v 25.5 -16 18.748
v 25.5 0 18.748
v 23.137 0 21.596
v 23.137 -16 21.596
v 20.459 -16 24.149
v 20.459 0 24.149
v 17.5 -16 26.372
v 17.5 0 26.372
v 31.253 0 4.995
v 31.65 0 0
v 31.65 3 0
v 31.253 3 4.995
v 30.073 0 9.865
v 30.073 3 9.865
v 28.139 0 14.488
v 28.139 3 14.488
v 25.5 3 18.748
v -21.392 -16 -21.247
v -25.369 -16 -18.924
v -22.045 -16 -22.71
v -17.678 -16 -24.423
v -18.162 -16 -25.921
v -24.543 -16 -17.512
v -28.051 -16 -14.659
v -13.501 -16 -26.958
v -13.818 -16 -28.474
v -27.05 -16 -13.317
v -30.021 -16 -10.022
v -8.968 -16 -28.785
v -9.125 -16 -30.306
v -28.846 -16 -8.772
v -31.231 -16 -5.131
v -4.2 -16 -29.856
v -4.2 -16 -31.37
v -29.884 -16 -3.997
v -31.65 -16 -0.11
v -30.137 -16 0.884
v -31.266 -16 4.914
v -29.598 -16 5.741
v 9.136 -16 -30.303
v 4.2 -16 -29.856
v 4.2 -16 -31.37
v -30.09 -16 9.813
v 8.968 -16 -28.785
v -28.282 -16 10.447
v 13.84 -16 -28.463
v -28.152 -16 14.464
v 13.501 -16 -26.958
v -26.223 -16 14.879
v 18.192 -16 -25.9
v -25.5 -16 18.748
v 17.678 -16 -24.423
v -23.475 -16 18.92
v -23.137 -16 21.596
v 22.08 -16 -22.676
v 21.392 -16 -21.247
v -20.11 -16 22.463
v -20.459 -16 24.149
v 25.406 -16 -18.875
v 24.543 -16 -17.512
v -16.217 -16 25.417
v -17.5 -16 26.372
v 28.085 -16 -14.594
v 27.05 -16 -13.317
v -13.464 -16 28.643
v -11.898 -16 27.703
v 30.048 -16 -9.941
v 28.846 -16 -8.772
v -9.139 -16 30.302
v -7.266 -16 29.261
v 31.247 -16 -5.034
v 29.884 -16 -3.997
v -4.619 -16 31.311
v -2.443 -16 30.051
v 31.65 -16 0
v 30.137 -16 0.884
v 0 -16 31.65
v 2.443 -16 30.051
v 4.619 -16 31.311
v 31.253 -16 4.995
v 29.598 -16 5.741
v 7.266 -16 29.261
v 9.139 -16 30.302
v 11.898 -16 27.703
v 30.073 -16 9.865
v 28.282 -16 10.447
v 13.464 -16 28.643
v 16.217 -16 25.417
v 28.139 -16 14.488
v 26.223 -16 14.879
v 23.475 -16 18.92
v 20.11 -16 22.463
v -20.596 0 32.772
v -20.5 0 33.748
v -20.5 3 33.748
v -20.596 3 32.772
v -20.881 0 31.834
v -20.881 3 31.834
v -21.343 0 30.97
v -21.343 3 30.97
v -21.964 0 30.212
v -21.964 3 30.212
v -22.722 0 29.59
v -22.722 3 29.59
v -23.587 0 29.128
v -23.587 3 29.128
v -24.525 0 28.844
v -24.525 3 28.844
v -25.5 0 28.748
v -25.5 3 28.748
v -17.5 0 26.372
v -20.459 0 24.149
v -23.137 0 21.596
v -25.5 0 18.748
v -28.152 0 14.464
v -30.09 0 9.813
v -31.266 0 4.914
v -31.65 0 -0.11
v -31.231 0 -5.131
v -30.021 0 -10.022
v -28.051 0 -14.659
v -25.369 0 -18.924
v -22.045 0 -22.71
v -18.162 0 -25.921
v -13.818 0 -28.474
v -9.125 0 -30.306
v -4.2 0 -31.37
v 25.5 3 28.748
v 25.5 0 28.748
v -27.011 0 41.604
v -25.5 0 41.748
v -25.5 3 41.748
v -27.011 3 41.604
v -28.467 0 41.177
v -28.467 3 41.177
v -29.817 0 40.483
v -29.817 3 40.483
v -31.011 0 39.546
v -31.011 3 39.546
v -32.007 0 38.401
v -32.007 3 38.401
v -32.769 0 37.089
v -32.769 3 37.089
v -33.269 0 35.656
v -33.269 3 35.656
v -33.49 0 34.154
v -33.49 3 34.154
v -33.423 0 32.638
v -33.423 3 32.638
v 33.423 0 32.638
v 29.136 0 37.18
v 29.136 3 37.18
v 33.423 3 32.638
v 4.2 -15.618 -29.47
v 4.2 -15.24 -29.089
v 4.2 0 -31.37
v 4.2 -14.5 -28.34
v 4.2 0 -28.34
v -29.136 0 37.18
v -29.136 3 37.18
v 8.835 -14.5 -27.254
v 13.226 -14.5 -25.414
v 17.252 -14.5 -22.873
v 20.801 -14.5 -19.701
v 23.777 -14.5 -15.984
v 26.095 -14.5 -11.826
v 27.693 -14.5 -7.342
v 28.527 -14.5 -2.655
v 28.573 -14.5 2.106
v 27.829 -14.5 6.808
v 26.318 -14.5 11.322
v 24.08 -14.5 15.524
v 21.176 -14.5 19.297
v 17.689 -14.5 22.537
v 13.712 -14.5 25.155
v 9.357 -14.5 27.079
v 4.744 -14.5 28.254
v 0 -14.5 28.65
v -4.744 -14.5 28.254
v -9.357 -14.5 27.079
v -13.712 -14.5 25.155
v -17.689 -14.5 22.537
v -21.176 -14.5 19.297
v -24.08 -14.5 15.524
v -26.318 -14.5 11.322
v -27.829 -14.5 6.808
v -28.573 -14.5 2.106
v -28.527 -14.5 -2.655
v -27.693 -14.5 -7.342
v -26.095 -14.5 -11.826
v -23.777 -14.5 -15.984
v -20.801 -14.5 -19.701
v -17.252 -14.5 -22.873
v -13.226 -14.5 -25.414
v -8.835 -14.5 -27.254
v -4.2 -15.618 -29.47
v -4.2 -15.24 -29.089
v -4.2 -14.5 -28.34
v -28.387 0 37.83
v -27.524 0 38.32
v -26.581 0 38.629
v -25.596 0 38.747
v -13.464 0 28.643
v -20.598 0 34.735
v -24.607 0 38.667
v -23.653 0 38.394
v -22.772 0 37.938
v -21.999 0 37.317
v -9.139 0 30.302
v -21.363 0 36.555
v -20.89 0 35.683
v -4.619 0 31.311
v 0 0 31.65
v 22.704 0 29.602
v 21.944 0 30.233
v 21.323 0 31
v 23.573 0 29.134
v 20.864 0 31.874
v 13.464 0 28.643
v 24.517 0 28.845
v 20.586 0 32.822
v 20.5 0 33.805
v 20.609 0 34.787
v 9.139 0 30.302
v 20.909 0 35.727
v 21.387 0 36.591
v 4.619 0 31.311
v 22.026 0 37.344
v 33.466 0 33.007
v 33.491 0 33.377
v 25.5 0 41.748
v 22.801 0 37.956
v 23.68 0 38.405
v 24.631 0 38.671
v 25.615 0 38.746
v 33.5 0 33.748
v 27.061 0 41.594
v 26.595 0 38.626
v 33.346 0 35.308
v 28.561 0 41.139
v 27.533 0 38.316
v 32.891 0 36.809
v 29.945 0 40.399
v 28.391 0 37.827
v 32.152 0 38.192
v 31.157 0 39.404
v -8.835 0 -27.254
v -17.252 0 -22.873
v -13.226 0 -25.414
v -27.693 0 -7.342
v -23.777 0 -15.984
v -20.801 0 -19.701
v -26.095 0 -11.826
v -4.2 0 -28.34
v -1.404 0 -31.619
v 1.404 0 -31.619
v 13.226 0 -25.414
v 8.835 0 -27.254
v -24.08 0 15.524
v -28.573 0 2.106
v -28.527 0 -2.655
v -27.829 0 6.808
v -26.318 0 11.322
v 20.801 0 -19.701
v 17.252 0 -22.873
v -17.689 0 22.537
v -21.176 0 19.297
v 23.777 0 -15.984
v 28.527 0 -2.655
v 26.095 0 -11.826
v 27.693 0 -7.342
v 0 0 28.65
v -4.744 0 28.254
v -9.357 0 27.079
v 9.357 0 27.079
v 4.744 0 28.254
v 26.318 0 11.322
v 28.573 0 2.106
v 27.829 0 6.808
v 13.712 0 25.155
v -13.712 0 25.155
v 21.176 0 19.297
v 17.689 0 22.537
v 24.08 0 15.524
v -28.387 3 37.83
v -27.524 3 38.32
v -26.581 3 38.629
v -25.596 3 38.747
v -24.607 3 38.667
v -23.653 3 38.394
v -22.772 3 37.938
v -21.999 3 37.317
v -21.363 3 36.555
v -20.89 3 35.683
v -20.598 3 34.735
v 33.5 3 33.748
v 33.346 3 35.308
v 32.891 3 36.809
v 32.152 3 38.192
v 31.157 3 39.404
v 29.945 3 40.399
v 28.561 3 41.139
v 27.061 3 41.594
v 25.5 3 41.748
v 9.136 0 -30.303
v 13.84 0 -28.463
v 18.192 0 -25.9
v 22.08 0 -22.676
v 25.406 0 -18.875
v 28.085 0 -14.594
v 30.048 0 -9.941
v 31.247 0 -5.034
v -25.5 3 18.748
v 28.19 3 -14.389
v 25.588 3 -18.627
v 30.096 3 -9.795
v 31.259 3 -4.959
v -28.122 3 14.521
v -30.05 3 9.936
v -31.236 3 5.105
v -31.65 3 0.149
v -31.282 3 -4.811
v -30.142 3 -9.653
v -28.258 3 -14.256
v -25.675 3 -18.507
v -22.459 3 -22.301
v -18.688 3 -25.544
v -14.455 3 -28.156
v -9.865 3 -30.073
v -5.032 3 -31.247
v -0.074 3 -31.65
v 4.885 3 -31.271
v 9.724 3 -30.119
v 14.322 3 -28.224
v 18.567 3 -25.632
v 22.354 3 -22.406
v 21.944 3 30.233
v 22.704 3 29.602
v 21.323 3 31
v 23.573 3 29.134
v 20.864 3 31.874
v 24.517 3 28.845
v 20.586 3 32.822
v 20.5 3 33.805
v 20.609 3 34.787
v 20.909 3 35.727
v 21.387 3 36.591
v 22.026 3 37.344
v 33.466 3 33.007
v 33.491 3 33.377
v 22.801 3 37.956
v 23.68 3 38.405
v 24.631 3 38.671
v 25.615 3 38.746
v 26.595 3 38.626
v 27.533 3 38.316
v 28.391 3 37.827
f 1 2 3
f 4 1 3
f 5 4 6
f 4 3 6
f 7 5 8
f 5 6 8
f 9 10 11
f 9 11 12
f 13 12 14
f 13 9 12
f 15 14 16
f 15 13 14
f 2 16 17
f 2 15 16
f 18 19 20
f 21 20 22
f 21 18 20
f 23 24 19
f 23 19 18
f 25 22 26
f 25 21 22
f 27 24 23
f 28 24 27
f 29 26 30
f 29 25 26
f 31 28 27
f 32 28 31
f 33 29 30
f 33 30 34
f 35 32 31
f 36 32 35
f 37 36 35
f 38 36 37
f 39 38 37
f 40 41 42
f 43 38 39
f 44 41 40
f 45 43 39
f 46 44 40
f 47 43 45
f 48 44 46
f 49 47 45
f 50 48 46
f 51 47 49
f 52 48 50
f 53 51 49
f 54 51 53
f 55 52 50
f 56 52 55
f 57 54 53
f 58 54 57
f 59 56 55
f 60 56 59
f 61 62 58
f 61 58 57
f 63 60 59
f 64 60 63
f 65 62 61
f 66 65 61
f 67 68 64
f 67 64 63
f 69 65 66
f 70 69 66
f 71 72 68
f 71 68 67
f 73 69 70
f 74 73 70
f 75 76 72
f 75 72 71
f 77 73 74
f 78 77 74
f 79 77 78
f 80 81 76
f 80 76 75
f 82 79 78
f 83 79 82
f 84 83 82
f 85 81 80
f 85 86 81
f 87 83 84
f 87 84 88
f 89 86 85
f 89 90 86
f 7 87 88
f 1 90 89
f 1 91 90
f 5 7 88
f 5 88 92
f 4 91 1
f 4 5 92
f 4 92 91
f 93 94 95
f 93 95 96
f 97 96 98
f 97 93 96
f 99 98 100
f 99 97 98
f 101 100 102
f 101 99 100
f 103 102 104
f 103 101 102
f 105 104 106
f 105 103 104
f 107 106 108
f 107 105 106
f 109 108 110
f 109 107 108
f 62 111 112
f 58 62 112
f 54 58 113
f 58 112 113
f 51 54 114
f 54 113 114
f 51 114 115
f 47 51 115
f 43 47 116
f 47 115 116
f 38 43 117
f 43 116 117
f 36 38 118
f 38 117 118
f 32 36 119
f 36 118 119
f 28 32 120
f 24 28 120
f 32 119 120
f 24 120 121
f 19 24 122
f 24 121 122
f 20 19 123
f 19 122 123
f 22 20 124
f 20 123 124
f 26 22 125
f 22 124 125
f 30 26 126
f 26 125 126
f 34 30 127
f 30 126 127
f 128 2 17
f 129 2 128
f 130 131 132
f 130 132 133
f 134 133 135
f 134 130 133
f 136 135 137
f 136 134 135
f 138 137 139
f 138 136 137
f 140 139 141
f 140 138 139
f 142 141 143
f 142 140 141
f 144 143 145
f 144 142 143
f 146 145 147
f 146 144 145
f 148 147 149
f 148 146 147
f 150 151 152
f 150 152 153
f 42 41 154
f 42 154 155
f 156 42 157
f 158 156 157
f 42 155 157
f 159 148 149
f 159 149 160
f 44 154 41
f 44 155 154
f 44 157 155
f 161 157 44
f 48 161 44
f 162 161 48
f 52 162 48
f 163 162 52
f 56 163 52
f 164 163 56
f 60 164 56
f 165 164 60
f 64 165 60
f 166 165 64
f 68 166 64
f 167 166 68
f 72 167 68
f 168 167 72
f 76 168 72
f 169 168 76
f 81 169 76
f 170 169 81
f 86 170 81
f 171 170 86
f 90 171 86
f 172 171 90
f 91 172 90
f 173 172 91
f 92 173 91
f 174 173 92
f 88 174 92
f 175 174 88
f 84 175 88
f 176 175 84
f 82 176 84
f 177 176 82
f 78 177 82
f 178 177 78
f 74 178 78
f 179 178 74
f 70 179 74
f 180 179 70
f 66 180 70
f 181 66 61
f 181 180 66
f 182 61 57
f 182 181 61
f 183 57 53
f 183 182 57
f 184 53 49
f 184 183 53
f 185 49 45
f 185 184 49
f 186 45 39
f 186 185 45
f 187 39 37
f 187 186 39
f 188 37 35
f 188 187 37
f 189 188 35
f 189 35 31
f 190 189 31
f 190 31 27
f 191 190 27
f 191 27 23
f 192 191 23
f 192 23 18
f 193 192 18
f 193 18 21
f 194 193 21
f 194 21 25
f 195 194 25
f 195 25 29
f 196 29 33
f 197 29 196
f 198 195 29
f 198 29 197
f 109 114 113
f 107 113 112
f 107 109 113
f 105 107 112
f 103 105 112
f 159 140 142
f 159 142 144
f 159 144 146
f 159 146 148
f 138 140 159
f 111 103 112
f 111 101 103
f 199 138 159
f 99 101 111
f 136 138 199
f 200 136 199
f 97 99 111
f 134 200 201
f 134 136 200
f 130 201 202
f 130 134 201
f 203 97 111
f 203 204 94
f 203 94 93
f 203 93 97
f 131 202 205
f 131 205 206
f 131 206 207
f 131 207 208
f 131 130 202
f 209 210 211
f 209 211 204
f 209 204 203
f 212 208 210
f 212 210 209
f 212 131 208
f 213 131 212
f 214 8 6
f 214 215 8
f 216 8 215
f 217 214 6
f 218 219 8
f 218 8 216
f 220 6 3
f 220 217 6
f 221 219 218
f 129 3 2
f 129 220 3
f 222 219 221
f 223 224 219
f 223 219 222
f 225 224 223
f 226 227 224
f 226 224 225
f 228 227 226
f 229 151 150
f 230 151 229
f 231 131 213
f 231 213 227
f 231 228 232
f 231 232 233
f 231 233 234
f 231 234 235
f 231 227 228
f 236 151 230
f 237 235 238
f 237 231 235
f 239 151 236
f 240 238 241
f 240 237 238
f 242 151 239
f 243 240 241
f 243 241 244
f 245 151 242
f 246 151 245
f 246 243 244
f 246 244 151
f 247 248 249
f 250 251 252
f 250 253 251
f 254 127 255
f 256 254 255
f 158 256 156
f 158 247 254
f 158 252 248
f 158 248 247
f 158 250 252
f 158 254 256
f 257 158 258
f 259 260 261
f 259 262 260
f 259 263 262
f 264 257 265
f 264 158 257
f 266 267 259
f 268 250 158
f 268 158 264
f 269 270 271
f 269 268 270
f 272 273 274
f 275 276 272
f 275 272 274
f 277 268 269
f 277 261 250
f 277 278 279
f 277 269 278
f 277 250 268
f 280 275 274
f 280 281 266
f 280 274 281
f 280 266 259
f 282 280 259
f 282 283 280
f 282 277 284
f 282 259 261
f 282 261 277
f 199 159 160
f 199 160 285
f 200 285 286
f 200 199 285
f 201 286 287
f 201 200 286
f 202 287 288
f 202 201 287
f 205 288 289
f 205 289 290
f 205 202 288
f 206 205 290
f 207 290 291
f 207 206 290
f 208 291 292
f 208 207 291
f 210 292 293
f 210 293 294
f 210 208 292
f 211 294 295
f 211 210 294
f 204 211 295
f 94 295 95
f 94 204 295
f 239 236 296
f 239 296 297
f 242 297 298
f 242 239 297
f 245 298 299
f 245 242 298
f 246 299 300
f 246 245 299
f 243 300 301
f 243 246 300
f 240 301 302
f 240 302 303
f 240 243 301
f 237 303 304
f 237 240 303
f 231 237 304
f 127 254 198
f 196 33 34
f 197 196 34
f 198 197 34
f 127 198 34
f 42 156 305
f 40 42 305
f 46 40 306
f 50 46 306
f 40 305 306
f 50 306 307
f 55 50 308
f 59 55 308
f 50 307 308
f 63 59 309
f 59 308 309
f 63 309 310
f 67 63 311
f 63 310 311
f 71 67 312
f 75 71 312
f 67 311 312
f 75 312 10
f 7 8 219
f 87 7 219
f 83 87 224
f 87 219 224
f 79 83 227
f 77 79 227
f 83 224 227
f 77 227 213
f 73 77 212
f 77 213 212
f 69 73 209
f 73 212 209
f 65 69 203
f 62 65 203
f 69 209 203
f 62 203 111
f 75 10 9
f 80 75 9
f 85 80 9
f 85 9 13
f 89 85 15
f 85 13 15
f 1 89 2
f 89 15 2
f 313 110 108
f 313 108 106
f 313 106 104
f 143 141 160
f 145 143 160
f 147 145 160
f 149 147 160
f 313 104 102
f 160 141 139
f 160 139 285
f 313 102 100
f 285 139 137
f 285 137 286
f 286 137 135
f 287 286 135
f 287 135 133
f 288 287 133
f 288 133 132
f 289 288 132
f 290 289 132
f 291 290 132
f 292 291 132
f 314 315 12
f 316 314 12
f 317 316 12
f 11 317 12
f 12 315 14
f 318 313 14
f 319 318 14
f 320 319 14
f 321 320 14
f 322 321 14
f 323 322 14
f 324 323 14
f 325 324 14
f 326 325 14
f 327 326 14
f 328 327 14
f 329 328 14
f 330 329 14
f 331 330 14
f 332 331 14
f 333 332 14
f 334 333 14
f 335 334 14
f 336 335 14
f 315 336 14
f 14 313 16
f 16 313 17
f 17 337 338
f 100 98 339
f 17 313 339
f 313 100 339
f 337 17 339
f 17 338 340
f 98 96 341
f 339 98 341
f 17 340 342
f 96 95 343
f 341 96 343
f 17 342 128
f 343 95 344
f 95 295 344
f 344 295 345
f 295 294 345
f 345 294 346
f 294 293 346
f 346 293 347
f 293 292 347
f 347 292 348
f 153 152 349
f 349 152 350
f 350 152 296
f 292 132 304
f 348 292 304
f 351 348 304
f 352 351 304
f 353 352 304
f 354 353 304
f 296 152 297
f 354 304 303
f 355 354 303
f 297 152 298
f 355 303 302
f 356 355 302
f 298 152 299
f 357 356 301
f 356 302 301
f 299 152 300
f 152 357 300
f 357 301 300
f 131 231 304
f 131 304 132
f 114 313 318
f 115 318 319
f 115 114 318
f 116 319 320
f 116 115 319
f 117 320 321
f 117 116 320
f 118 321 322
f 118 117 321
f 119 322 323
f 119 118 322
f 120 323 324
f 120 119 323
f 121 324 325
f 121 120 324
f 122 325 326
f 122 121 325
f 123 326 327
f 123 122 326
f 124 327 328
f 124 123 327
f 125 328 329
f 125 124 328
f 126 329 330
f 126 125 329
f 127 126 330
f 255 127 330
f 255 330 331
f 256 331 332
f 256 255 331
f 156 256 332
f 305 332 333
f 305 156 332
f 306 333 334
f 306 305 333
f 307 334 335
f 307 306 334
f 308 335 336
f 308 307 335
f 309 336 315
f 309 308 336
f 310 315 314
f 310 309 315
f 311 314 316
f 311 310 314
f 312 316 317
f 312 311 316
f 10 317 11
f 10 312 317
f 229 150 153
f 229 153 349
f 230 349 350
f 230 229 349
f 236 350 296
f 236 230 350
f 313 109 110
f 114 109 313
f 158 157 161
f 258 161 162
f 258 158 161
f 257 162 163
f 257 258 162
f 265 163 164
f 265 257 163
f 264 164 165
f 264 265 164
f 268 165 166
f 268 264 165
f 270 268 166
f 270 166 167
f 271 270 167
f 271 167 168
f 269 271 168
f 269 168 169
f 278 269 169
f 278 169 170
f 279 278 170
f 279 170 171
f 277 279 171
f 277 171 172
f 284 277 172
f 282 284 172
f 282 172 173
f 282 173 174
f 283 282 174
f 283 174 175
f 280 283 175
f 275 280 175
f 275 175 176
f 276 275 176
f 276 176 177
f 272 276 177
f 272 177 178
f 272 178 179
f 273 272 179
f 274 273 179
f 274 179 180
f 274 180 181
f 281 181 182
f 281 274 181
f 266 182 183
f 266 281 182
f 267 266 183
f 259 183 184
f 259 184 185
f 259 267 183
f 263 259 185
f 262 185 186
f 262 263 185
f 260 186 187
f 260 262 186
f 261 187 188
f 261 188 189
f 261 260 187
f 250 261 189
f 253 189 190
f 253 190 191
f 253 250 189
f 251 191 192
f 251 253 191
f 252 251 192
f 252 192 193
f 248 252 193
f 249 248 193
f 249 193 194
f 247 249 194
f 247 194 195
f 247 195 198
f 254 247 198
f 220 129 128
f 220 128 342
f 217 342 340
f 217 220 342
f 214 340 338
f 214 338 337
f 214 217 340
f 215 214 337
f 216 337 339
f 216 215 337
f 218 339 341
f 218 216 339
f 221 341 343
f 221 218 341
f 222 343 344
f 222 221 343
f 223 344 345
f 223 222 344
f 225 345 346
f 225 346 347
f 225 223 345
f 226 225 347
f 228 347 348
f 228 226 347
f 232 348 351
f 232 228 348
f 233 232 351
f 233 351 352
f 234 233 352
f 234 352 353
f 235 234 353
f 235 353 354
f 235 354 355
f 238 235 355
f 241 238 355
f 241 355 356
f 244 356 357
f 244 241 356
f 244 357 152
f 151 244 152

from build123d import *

# Parameters (mm, degrees)
F6_R     = 28.65
F1_DEPTH = 3
F2_DEPTH = 16
F4_DEPTH = 16
F5_SIZE  = 1.5


with BuildPart() as f1:
    # F6 (on Front) → F1 (new body)
    with BuildSketch(Plane.XZ):
        with BuildLine():
            ThreePointArc((-25.5, 18.7475998464), (-9.8652800264, -30.0732231395), (31.65, 0))
            ThreePointArc((31.65, 0), (30.0732231395, 9.8652800264), (25.5, 18.7475998464))
            ThreePointArc((25.5, 18.7475998464), (21.8353418806, 22.9115766581), (17.5, 26.3718126036))
            ThreePointArc((17.5, 26.3718126036), (0, 31.65), (-17.5, 26.3718126036))
            ThreePointArc((-17.5, 26.3718126036), (-21.8353418806, 22.9115766581), (-25.5, 18.7475998464))
        make_face()
        Circle(F6_R, mode=Mode.SUBTRACT)
        Circle(F6_R)
        with BuildLine():
            ThreePointArc((-17.5, 26.3718126036), (0, 31.65), (17.5, 26.3718126036))
            Line((17.5, 26.3718126036), (17.5, 33.7475998464))
            ThreePointArc((17.5, 33.7475998464), (19.8431457505, 39.4044540959), (25.5, 41.7475998464))
            Line((25.5, 41.7475998464), (-25.5, 41.7475998464))
            ThreePointArc((-25.5, 41.7475998464), (-19.8431457505, 39.4044540959), (-17.5, 33.7475998464))
            Line((-17.5, 33.7475998464), (-17.5, 26.3718126036))
        make_face()
        with BuildLine():
            Line((-25.5, 28.7475998464), (-25.5, 25.7475998464))
            ThreePointArc((-25.5, 25.7475998464), (-19.8431457505, 28.0907455969), (-17.5, 33.7475998464))
            ThreePointArc((-17.5, 33.7475998464), (-19.8431457505, 39.4044540959), (-25.5, 41.7475998464))
            ThreePointArc((-25.5, 41.7475998464), (-31.5363482338, 38.9975998464), (-33.4227070569, 32.6382248464))
            Line((-33.4227070569, 32.6382248464), (-29.1360609327, 37.1796634958))
            ThreePointArc((-29.1360609327, 37.1796634958), (-23.6534227154, 38.3941203006), (-20.5, 33.7475998464))
            ThreePointArc((-20.5, 33.7475998464), (-21.9644660941, 30.2120659404), (-25.5, 28.7475998464))
        make_face()
        with BuildLine():
            ThreePointArc((17.5, 33.7475998464), (19.8431457505, 28.0907455969), (25.5, 25.7475998464))
            Line((25.5, 25.7475998464), (25.5, 28.7475998464))
            ThreePointArc((25.5, 28.7475998464), (20.9086865579, 35.7274586485), (29.1360609327, 37.1796634958))
            Line((29.1360609327, 37.1796634958), (33.4227070569, 32.6382248464))
            ThreePointArc((33.4227070569, 32.6382248464), (33.480653371, 33.1915676779), (33.5, 33.7475998464))
            ThreePointArc((33.5, 33.7475998464), (31.1568542495, 39.4044540959), (25.5, 41.7475998464))
            ThreePointArc((25.5, 41.7475998464), (19.8431457505, 39.4044540959), (17.5, 33.7475998464))
        make_face()
        with BuildLine():
            Line((-25.5, 25.7475998464), (-25.5, 18.7475998464))
            ThreePointArc((-25.5, 18.7475998464), (-21.8353418806, 22.9115766581), (-17.5, 26.3718126036))
            Line((-17.5, 26.3718126036), (-17.5, 33.7475998464))
            ThreePointArc((-17.5, 33.7475998464), (-19.8431457505, 28.0907455969), (-25.5, 25.7475998464))
        make_face()
        with BuildLine():
            ThreePointArc((17.5, 26.3718126036), (21.8353418806, 22.9115766581), (25.5, 18.7475998464))
            Line((25.5, 18.7475998464), (25.5, 25.7475998464))
            ThreePointArc((25.5, 25.7475998464), (19.8431457505, 28.0907455969), (17.5, 33.7475998464))
            Line((17.5, 33.7475998464), (17.5, 26.3718126036))
        make_face()
    extrude(amount=-F1_DEPTH)

    # F6 (on Front) → F2 (join)
    with BuildSketch(Plane.XZ):
        with BuildLine():
            ThreePointArc((-25.5, 18.7475998464), (-9.8652800264, -30.0732231395), (31.65, 0))
            ThreePointArc((31.65, 0), (30.0732231395, 9.8652800264), (25.5, 18.7475998464))
            ThreePointArc((25.5, 18.7475998464), (21.8353418806, 22.9115766581), (17.5, 26.3718126036))
            ThreePointArc((17.5, 26.3718126036), (0, 31.65), (-17.5, 26.3718126036))
            ThreePointArc((-17.5, 26.3718126036), (-21.8353418806, 22.9115766581), (-25.5, 18.7475998464))
        make_face()
        Circle(F6_R, mode=Mode.SUBTRACT)
    extrude(amount=F2_DEPTH)

    # F3 (on face) → F4 (cut, through all)
    with BuildSketch(Plane.XZ.offset(16)):
        with BuildLine():
            ThreePointArc((4.2, -28.3404745902), (0, -28.65), (-4.2, -28.3404745902))
            Line((-4.2, -28.3404745902), (-4.2, -31.3700892571))
            ThreePointArc((-4.2, -31.3700892571), (0, -31.65), (4.2, -31.3700892571))
            Line((4.2, -31.3700892571), (4.2, -28.3404745902))
        make_face()
    extrude(amount=-F4_DEPTH, mode=Mode.SUBTRACT)

    # F5
    f5_edges = [f1.edges().sort_by_distance(p)[0] for p in [
        (-18.714867, -16, 21.69277),
    ]]
    chamfer(f5_edges, length=F5_SIZE)


solid = f1.part
